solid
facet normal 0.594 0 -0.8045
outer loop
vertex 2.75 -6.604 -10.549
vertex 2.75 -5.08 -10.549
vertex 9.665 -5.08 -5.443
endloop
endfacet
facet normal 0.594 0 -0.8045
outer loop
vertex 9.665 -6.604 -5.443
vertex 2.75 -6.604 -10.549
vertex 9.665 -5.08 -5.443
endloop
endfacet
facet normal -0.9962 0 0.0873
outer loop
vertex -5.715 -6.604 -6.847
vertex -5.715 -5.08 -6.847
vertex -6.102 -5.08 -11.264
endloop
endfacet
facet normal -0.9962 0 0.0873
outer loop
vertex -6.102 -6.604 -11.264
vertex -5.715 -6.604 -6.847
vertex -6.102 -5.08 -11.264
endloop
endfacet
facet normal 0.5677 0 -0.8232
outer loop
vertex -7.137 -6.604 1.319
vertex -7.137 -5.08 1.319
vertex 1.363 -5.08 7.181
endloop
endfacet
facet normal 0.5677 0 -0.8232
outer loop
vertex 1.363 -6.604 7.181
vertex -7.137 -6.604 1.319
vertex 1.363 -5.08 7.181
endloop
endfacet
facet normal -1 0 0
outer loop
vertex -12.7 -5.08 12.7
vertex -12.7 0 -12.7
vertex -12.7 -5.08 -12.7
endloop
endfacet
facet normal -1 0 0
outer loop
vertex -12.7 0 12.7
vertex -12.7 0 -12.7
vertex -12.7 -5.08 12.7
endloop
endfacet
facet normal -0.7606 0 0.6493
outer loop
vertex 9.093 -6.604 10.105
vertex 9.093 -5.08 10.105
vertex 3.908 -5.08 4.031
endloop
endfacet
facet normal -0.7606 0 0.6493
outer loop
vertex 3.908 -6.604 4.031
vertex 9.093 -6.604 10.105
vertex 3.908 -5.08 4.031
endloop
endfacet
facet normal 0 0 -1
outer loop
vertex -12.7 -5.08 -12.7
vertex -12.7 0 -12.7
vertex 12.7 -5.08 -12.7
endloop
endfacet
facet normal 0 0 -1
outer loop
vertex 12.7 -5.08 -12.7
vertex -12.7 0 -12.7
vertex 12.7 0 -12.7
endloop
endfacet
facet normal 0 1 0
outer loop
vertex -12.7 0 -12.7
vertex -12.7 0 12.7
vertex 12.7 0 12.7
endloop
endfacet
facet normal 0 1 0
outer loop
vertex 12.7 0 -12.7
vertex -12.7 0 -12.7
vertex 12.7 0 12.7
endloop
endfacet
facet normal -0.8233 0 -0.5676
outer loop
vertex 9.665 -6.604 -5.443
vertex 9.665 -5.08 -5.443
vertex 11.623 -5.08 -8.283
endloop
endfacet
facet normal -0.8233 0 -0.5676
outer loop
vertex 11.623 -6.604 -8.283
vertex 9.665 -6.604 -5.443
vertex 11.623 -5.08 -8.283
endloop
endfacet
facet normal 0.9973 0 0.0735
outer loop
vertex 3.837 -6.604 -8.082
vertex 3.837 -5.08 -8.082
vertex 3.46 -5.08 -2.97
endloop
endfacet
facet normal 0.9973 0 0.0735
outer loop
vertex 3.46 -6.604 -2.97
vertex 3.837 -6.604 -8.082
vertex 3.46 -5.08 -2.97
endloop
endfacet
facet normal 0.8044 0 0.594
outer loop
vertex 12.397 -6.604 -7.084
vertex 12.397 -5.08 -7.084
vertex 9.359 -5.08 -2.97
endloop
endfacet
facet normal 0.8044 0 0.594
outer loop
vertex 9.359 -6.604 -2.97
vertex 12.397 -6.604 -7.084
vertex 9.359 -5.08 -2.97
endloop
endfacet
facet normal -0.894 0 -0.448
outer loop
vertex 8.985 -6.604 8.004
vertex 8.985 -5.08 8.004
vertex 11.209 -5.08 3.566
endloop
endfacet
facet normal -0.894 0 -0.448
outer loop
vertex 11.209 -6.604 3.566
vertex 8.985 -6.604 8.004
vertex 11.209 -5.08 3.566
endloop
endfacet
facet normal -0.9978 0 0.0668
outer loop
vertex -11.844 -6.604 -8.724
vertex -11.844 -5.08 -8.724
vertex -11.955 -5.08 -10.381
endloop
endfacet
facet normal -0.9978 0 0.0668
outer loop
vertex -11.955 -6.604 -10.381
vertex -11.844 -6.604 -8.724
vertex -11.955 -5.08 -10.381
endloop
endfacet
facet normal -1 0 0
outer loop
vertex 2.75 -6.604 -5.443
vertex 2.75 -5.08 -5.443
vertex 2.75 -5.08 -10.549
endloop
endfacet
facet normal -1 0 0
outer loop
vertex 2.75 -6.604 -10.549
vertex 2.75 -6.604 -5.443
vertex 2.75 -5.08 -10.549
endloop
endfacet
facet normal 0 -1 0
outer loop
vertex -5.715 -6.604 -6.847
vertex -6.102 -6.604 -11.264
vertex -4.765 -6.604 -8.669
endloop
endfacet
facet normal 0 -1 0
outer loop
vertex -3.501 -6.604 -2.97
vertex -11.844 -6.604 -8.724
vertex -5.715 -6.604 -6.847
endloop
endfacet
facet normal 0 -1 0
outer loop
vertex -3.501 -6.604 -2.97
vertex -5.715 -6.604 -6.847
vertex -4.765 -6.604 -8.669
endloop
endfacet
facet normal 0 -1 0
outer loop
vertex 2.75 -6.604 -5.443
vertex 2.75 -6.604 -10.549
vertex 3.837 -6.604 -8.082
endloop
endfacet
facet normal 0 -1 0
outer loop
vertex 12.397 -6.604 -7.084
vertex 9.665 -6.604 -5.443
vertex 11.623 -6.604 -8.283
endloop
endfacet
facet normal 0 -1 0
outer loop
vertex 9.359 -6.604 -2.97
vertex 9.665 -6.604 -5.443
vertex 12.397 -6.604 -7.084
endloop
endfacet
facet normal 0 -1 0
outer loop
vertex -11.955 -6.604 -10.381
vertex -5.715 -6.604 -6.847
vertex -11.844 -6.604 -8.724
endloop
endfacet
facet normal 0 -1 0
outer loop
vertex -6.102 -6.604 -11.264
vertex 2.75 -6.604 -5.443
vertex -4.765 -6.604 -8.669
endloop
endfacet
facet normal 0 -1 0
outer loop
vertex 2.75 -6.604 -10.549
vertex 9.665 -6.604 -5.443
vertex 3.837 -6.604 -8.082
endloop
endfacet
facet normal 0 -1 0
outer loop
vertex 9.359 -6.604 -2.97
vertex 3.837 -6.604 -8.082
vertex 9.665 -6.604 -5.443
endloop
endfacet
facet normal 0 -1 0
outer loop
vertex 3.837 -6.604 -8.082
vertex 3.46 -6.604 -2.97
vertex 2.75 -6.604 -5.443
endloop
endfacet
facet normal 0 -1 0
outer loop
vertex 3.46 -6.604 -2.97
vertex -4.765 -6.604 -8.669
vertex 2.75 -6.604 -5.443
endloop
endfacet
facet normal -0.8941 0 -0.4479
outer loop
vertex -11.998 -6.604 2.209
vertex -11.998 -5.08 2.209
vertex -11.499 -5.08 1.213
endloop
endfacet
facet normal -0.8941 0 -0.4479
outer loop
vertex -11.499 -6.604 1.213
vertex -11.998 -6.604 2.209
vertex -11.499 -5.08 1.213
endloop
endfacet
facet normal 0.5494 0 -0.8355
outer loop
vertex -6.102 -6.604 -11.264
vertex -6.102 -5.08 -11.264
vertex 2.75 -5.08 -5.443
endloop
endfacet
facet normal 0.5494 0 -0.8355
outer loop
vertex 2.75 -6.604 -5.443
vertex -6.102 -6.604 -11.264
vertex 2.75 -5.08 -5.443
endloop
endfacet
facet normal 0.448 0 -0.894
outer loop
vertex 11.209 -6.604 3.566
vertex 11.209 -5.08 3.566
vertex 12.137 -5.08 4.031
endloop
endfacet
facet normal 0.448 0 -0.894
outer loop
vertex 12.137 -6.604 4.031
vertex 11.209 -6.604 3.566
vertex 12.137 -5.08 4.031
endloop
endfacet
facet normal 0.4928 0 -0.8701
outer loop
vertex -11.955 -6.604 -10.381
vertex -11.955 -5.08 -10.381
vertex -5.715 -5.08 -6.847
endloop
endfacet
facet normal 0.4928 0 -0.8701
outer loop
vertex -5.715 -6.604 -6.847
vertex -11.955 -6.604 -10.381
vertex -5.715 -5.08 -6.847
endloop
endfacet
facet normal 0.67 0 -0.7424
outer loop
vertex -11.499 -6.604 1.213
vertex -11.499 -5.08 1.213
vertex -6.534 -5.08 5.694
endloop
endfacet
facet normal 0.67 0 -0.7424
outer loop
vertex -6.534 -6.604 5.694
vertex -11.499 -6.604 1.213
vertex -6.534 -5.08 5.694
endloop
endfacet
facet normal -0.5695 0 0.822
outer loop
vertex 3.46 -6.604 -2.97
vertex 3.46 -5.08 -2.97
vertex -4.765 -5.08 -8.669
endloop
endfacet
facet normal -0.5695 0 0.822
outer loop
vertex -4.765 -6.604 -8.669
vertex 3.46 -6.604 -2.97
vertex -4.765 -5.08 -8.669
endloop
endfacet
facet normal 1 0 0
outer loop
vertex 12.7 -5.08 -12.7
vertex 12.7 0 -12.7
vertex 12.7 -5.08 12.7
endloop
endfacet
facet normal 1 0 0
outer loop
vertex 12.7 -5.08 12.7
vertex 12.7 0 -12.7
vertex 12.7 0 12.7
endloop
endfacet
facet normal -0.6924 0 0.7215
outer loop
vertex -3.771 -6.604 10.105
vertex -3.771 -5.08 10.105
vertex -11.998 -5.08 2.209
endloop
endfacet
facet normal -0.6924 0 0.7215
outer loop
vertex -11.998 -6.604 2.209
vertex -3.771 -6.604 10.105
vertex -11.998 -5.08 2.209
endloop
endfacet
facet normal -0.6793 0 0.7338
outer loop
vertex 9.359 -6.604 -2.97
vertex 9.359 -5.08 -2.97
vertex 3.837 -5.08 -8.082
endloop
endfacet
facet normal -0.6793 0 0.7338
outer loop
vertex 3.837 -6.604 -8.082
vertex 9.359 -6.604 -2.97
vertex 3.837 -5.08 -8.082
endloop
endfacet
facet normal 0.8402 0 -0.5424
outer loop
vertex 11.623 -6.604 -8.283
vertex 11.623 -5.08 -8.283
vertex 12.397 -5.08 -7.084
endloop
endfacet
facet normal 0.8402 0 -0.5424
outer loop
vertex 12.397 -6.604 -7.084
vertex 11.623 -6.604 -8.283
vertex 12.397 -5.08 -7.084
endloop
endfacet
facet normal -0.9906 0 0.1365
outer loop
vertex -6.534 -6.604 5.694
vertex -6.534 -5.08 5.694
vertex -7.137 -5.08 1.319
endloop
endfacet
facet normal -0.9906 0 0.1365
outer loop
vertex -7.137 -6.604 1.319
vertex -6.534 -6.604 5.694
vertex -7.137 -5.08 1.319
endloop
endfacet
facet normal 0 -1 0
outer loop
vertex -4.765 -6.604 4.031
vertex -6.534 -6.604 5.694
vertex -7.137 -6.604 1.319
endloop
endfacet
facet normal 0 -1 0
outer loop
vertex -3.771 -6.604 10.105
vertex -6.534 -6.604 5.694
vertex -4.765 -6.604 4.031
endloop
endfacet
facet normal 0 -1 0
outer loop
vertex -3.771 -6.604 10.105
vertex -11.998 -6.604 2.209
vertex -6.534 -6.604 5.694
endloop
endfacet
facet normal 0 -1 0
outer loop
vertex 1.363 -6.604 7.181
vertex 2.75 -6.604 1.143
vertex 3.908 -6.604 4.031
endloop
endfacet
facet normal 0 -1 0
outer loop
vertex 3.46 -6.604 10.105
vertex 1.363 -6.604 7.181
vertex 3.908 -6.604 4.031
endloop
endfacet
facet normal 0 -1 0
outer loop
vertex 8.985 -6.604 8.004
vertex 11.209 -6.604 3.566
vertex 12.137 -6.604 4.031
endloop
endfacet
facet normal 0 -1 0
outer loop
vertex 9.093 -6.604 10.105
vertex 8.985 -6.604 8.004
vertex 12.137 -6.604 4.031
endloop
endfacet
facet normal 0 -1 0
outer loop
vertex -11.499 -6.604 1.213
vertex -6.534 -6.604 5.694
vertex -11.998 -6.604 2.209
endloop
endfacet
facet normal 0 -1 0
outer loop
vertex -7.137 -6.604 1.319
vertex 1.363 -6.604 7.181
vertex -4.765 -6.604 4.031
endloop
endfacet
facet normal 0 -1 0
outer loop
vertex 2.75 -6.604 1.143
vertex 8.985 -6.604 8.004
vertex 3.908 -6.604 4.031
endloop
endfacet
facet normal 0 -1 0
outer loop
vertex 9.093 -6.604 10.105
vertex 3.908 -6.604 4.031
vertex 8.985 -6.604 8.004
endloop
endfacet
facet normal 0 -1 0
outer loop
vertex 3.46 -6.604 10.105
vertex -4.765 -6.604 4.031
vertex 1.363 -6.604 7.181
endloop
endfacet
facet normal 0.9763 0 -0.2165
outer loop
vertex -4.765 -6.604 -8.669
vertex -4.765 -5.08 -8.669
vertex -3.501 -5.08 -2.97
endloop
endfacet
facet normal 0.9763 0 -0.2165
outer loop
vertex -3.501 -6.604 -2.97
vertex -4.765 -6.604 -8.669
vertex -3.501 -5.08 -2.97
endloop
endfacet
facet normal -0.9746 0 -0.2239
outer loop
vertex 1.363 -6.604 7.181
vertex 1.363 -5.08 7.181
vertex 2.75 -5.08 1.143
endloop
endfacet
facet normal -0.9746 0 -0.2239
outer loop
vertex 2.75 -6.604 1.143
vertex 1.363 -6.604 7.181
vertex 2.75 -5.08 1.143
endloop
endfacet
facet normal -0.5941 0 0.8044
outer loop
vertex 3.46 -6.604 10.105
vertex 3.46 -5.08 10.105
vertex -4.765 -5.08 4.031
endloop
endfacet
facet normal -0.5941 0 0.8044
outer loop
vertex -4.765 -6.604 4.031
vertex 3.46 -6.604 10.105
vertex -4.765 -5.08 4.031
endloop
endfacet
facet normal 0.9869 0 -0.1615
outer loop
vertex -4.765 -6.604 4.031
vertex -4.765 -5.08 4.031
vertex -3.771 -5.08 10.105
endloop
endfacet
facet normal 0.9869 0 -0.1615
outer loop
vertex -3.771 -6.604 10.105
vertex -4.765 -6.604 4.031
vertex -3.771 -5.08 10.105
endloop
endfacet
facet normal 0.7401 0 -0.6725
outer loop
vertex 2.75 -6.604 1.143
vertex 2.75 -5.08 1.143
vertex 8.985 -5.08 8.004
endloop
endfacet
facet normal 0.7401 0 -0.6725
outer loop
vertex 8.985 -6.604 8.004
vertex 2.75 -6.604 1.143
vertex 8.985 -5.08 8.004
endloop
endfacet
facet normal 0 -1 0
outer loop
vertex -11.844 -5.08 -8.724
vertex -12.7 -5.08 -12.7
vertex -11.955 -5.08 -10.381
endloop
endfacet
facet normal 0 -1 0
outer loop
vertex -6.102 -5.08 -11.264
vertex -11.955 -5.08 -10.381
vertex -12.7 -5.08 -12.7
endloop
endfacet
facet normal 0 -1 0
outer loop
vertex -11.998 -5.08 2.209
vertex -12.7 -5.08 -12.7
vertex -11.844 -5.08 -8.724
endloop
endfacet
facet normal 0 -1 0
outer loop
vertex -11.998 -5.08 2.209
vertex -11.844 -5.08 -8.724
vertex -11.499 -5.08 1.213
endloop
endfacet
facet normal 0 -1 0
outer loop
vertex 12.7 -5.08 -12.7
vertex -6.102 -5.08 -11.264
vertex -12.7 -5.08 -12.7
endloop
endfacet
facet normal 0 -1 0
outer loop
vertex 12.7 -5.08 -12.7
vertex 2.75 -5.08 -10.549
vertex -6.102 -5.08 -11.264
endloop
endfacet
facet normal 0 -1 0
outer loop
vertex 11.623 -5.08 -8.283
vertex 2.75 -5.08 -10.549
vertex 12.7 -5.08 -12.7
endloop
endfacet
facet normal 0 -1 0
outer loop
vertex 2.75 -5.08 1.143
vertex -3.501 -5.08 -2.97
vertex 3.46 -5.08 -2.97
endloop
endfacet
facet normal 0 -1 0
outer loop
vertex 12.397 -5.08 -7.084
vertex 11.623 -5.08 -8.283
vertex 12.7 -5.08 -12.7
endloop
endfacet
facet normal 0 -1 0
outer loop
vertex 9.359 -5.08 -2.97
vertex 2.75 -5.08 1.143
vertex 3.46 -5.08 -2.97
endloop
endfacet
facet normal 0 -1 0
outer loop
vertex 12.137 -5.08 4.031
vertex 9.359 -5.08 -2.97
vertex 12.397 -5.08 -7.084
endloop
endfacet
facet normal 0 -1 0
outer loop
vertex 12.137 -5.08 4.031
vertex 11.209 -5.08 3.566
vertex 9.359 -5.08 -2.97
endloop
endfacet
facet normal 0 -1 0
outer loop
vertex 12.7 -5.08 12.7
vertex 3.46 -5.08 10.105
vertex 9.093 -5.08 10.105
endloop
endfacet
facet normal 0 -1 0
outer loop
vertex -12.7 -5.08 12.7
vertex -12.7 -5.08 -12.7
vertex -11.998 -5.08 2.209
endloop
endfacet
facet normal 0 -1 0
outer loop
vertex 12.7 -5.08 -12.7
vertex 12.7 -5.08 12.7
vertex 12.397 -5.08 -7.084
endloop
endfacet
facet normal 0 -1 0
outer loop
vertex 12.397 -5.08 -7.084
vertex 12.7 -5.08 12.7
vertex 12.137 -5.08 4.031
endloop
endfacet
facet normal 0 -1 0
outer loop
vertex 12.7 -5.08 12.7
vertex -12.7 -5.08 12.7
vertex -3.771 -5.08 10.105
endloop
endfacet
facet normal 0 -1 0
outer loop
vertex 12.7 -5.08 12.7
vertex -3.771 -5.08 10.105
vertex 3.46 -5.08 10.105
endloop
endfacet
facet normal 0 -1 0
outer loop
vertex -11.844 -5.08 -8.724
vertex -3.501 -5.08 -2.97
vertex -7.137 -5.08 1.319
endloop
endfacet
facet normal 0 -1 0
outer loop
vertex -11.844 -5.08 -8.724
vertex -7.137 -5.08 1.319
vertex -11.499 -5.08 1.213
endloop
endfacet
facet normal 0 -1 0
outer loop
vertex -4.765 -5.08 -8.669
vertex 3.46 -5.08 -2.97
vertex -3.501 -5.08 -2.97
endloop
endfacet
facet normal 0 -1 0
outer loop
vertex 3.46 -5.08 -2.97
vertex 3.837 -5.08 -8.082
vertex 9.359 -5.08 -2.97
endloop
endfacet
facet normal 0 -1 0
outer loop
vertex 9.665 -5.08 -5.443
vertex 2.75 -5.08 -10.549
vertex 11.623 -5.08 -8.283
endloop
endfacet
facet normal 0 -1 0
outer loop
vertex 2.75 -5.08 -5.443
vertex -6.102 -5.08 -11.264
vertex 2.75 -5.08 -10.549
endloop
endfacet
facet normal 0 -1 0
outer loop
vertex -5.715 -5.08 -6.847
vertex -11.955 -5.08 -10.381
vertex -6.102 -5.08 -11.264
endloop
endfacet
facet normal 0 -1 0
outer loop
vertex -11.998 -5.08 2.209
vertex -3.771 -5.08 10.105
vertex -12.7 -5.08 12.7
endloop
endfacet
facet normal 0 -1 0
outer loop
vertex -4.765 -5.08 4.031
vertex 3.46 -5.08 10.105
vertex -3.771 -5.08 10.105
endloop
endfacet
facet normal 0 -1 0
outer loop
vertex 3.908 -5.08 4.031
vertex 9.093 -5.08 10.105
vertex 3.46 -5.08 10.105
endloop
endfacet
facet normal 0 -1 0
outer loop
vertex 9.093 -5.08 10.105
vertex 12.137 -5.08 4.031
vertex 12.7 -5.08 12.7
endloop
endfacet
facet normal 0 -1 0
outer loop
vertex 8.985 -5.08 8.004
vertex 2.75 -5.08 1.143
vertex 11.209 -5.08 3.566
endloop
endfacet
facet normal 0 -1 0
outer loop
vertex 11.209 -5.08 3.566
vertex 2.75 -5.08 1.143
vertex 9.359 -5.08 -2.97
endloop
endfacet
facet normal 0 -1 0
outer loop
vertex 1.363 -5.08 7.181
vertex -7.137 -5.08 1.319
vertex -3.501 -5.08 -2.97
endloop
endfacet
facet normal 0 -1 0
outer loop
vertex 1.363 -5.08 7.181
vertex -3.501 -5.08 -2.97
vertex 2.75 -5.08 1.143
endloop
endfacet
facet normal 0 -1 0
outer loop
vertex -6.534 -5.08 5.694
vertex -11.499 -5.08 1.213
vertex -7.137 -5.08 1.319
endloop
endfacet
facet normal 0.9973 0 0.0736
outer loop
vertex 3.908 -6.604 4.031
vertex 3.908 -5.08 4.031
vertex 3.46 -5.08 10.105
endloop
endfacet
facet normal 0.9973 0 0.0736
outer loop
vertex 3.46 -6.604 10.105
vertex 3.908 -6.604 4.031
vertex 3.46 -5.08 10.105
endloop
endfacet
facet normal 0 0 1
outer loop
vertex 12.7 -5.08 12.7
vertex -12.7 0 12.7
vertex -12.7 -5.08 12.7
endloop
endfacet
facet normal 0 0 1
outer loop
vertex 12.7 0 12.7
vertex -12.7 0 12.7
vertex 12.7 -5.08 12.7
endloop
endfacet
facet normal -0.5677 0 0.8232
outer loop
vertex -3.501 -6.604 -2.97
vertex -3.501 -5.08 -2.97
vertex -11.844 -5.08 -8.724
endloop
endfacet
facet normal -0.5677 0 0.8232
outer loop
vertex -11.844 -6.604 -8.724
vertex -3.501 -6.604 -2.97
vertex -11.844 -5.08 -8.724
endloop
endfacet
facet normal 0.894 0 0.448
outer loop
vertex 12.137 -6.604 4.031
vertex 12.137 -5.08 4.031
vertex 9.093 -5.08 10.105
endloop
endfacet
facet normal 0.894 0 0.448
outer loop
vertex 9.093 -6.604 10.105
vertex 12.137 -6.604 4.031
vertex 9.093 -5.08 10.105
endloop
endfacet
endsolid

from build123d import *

# Parameters (mm, degrees)
F0_W     = 25.4
F0_H     = 25.4
F1_DEPTH = 5.08
F3_DEPTH = 1.524


with BuildPart() as f1:
    # F0 (on Front) → F1 (new body)
    with BuildSketch(Plane.XZ):
        Rectangle(F0_W, F0_H)
    extrude(amount=F1_DEPTH)

    # F2 (on face) → F3 (join)
    with BuildSketch(Plane.XZ.offset(5.08)):
        Polygon((-3.770767, 10.104783), (-11.998158, 2.208696), (-11.499409, 1.213393), (-6.533915, 5.693889), (-7.137069, 1.319007), (1.363335, 7.181271), (2.750369, 1.142781), (8.985079, 8.0043), (11.209368, 3.565513), (12.137308, 4.030507), (9.09347, 10.104783), (3.907741, 4.030507), (3.459665, 10.104783), (-4.764671, 4.030507), align=None)
        Polygon((-3.500791, -2.970403), (-11.84413, -8.724348), (-11.954566, -10.380869), (-5.715, -6.846956), (-6.101522, -11.264347), (2.750369, -5.442571), (2.750369, -10.549271), (9.664643, -5.442571), (11.623261, -8.282608), (12.397479, -7.083917), (9.359348, -2.970403), (3.83674, -8.08217), (3.459665, -2.970403), (-4.764671, -8.669131), align=None)
    extrude(amount=F3_DEPTH)


solid = f1.part
